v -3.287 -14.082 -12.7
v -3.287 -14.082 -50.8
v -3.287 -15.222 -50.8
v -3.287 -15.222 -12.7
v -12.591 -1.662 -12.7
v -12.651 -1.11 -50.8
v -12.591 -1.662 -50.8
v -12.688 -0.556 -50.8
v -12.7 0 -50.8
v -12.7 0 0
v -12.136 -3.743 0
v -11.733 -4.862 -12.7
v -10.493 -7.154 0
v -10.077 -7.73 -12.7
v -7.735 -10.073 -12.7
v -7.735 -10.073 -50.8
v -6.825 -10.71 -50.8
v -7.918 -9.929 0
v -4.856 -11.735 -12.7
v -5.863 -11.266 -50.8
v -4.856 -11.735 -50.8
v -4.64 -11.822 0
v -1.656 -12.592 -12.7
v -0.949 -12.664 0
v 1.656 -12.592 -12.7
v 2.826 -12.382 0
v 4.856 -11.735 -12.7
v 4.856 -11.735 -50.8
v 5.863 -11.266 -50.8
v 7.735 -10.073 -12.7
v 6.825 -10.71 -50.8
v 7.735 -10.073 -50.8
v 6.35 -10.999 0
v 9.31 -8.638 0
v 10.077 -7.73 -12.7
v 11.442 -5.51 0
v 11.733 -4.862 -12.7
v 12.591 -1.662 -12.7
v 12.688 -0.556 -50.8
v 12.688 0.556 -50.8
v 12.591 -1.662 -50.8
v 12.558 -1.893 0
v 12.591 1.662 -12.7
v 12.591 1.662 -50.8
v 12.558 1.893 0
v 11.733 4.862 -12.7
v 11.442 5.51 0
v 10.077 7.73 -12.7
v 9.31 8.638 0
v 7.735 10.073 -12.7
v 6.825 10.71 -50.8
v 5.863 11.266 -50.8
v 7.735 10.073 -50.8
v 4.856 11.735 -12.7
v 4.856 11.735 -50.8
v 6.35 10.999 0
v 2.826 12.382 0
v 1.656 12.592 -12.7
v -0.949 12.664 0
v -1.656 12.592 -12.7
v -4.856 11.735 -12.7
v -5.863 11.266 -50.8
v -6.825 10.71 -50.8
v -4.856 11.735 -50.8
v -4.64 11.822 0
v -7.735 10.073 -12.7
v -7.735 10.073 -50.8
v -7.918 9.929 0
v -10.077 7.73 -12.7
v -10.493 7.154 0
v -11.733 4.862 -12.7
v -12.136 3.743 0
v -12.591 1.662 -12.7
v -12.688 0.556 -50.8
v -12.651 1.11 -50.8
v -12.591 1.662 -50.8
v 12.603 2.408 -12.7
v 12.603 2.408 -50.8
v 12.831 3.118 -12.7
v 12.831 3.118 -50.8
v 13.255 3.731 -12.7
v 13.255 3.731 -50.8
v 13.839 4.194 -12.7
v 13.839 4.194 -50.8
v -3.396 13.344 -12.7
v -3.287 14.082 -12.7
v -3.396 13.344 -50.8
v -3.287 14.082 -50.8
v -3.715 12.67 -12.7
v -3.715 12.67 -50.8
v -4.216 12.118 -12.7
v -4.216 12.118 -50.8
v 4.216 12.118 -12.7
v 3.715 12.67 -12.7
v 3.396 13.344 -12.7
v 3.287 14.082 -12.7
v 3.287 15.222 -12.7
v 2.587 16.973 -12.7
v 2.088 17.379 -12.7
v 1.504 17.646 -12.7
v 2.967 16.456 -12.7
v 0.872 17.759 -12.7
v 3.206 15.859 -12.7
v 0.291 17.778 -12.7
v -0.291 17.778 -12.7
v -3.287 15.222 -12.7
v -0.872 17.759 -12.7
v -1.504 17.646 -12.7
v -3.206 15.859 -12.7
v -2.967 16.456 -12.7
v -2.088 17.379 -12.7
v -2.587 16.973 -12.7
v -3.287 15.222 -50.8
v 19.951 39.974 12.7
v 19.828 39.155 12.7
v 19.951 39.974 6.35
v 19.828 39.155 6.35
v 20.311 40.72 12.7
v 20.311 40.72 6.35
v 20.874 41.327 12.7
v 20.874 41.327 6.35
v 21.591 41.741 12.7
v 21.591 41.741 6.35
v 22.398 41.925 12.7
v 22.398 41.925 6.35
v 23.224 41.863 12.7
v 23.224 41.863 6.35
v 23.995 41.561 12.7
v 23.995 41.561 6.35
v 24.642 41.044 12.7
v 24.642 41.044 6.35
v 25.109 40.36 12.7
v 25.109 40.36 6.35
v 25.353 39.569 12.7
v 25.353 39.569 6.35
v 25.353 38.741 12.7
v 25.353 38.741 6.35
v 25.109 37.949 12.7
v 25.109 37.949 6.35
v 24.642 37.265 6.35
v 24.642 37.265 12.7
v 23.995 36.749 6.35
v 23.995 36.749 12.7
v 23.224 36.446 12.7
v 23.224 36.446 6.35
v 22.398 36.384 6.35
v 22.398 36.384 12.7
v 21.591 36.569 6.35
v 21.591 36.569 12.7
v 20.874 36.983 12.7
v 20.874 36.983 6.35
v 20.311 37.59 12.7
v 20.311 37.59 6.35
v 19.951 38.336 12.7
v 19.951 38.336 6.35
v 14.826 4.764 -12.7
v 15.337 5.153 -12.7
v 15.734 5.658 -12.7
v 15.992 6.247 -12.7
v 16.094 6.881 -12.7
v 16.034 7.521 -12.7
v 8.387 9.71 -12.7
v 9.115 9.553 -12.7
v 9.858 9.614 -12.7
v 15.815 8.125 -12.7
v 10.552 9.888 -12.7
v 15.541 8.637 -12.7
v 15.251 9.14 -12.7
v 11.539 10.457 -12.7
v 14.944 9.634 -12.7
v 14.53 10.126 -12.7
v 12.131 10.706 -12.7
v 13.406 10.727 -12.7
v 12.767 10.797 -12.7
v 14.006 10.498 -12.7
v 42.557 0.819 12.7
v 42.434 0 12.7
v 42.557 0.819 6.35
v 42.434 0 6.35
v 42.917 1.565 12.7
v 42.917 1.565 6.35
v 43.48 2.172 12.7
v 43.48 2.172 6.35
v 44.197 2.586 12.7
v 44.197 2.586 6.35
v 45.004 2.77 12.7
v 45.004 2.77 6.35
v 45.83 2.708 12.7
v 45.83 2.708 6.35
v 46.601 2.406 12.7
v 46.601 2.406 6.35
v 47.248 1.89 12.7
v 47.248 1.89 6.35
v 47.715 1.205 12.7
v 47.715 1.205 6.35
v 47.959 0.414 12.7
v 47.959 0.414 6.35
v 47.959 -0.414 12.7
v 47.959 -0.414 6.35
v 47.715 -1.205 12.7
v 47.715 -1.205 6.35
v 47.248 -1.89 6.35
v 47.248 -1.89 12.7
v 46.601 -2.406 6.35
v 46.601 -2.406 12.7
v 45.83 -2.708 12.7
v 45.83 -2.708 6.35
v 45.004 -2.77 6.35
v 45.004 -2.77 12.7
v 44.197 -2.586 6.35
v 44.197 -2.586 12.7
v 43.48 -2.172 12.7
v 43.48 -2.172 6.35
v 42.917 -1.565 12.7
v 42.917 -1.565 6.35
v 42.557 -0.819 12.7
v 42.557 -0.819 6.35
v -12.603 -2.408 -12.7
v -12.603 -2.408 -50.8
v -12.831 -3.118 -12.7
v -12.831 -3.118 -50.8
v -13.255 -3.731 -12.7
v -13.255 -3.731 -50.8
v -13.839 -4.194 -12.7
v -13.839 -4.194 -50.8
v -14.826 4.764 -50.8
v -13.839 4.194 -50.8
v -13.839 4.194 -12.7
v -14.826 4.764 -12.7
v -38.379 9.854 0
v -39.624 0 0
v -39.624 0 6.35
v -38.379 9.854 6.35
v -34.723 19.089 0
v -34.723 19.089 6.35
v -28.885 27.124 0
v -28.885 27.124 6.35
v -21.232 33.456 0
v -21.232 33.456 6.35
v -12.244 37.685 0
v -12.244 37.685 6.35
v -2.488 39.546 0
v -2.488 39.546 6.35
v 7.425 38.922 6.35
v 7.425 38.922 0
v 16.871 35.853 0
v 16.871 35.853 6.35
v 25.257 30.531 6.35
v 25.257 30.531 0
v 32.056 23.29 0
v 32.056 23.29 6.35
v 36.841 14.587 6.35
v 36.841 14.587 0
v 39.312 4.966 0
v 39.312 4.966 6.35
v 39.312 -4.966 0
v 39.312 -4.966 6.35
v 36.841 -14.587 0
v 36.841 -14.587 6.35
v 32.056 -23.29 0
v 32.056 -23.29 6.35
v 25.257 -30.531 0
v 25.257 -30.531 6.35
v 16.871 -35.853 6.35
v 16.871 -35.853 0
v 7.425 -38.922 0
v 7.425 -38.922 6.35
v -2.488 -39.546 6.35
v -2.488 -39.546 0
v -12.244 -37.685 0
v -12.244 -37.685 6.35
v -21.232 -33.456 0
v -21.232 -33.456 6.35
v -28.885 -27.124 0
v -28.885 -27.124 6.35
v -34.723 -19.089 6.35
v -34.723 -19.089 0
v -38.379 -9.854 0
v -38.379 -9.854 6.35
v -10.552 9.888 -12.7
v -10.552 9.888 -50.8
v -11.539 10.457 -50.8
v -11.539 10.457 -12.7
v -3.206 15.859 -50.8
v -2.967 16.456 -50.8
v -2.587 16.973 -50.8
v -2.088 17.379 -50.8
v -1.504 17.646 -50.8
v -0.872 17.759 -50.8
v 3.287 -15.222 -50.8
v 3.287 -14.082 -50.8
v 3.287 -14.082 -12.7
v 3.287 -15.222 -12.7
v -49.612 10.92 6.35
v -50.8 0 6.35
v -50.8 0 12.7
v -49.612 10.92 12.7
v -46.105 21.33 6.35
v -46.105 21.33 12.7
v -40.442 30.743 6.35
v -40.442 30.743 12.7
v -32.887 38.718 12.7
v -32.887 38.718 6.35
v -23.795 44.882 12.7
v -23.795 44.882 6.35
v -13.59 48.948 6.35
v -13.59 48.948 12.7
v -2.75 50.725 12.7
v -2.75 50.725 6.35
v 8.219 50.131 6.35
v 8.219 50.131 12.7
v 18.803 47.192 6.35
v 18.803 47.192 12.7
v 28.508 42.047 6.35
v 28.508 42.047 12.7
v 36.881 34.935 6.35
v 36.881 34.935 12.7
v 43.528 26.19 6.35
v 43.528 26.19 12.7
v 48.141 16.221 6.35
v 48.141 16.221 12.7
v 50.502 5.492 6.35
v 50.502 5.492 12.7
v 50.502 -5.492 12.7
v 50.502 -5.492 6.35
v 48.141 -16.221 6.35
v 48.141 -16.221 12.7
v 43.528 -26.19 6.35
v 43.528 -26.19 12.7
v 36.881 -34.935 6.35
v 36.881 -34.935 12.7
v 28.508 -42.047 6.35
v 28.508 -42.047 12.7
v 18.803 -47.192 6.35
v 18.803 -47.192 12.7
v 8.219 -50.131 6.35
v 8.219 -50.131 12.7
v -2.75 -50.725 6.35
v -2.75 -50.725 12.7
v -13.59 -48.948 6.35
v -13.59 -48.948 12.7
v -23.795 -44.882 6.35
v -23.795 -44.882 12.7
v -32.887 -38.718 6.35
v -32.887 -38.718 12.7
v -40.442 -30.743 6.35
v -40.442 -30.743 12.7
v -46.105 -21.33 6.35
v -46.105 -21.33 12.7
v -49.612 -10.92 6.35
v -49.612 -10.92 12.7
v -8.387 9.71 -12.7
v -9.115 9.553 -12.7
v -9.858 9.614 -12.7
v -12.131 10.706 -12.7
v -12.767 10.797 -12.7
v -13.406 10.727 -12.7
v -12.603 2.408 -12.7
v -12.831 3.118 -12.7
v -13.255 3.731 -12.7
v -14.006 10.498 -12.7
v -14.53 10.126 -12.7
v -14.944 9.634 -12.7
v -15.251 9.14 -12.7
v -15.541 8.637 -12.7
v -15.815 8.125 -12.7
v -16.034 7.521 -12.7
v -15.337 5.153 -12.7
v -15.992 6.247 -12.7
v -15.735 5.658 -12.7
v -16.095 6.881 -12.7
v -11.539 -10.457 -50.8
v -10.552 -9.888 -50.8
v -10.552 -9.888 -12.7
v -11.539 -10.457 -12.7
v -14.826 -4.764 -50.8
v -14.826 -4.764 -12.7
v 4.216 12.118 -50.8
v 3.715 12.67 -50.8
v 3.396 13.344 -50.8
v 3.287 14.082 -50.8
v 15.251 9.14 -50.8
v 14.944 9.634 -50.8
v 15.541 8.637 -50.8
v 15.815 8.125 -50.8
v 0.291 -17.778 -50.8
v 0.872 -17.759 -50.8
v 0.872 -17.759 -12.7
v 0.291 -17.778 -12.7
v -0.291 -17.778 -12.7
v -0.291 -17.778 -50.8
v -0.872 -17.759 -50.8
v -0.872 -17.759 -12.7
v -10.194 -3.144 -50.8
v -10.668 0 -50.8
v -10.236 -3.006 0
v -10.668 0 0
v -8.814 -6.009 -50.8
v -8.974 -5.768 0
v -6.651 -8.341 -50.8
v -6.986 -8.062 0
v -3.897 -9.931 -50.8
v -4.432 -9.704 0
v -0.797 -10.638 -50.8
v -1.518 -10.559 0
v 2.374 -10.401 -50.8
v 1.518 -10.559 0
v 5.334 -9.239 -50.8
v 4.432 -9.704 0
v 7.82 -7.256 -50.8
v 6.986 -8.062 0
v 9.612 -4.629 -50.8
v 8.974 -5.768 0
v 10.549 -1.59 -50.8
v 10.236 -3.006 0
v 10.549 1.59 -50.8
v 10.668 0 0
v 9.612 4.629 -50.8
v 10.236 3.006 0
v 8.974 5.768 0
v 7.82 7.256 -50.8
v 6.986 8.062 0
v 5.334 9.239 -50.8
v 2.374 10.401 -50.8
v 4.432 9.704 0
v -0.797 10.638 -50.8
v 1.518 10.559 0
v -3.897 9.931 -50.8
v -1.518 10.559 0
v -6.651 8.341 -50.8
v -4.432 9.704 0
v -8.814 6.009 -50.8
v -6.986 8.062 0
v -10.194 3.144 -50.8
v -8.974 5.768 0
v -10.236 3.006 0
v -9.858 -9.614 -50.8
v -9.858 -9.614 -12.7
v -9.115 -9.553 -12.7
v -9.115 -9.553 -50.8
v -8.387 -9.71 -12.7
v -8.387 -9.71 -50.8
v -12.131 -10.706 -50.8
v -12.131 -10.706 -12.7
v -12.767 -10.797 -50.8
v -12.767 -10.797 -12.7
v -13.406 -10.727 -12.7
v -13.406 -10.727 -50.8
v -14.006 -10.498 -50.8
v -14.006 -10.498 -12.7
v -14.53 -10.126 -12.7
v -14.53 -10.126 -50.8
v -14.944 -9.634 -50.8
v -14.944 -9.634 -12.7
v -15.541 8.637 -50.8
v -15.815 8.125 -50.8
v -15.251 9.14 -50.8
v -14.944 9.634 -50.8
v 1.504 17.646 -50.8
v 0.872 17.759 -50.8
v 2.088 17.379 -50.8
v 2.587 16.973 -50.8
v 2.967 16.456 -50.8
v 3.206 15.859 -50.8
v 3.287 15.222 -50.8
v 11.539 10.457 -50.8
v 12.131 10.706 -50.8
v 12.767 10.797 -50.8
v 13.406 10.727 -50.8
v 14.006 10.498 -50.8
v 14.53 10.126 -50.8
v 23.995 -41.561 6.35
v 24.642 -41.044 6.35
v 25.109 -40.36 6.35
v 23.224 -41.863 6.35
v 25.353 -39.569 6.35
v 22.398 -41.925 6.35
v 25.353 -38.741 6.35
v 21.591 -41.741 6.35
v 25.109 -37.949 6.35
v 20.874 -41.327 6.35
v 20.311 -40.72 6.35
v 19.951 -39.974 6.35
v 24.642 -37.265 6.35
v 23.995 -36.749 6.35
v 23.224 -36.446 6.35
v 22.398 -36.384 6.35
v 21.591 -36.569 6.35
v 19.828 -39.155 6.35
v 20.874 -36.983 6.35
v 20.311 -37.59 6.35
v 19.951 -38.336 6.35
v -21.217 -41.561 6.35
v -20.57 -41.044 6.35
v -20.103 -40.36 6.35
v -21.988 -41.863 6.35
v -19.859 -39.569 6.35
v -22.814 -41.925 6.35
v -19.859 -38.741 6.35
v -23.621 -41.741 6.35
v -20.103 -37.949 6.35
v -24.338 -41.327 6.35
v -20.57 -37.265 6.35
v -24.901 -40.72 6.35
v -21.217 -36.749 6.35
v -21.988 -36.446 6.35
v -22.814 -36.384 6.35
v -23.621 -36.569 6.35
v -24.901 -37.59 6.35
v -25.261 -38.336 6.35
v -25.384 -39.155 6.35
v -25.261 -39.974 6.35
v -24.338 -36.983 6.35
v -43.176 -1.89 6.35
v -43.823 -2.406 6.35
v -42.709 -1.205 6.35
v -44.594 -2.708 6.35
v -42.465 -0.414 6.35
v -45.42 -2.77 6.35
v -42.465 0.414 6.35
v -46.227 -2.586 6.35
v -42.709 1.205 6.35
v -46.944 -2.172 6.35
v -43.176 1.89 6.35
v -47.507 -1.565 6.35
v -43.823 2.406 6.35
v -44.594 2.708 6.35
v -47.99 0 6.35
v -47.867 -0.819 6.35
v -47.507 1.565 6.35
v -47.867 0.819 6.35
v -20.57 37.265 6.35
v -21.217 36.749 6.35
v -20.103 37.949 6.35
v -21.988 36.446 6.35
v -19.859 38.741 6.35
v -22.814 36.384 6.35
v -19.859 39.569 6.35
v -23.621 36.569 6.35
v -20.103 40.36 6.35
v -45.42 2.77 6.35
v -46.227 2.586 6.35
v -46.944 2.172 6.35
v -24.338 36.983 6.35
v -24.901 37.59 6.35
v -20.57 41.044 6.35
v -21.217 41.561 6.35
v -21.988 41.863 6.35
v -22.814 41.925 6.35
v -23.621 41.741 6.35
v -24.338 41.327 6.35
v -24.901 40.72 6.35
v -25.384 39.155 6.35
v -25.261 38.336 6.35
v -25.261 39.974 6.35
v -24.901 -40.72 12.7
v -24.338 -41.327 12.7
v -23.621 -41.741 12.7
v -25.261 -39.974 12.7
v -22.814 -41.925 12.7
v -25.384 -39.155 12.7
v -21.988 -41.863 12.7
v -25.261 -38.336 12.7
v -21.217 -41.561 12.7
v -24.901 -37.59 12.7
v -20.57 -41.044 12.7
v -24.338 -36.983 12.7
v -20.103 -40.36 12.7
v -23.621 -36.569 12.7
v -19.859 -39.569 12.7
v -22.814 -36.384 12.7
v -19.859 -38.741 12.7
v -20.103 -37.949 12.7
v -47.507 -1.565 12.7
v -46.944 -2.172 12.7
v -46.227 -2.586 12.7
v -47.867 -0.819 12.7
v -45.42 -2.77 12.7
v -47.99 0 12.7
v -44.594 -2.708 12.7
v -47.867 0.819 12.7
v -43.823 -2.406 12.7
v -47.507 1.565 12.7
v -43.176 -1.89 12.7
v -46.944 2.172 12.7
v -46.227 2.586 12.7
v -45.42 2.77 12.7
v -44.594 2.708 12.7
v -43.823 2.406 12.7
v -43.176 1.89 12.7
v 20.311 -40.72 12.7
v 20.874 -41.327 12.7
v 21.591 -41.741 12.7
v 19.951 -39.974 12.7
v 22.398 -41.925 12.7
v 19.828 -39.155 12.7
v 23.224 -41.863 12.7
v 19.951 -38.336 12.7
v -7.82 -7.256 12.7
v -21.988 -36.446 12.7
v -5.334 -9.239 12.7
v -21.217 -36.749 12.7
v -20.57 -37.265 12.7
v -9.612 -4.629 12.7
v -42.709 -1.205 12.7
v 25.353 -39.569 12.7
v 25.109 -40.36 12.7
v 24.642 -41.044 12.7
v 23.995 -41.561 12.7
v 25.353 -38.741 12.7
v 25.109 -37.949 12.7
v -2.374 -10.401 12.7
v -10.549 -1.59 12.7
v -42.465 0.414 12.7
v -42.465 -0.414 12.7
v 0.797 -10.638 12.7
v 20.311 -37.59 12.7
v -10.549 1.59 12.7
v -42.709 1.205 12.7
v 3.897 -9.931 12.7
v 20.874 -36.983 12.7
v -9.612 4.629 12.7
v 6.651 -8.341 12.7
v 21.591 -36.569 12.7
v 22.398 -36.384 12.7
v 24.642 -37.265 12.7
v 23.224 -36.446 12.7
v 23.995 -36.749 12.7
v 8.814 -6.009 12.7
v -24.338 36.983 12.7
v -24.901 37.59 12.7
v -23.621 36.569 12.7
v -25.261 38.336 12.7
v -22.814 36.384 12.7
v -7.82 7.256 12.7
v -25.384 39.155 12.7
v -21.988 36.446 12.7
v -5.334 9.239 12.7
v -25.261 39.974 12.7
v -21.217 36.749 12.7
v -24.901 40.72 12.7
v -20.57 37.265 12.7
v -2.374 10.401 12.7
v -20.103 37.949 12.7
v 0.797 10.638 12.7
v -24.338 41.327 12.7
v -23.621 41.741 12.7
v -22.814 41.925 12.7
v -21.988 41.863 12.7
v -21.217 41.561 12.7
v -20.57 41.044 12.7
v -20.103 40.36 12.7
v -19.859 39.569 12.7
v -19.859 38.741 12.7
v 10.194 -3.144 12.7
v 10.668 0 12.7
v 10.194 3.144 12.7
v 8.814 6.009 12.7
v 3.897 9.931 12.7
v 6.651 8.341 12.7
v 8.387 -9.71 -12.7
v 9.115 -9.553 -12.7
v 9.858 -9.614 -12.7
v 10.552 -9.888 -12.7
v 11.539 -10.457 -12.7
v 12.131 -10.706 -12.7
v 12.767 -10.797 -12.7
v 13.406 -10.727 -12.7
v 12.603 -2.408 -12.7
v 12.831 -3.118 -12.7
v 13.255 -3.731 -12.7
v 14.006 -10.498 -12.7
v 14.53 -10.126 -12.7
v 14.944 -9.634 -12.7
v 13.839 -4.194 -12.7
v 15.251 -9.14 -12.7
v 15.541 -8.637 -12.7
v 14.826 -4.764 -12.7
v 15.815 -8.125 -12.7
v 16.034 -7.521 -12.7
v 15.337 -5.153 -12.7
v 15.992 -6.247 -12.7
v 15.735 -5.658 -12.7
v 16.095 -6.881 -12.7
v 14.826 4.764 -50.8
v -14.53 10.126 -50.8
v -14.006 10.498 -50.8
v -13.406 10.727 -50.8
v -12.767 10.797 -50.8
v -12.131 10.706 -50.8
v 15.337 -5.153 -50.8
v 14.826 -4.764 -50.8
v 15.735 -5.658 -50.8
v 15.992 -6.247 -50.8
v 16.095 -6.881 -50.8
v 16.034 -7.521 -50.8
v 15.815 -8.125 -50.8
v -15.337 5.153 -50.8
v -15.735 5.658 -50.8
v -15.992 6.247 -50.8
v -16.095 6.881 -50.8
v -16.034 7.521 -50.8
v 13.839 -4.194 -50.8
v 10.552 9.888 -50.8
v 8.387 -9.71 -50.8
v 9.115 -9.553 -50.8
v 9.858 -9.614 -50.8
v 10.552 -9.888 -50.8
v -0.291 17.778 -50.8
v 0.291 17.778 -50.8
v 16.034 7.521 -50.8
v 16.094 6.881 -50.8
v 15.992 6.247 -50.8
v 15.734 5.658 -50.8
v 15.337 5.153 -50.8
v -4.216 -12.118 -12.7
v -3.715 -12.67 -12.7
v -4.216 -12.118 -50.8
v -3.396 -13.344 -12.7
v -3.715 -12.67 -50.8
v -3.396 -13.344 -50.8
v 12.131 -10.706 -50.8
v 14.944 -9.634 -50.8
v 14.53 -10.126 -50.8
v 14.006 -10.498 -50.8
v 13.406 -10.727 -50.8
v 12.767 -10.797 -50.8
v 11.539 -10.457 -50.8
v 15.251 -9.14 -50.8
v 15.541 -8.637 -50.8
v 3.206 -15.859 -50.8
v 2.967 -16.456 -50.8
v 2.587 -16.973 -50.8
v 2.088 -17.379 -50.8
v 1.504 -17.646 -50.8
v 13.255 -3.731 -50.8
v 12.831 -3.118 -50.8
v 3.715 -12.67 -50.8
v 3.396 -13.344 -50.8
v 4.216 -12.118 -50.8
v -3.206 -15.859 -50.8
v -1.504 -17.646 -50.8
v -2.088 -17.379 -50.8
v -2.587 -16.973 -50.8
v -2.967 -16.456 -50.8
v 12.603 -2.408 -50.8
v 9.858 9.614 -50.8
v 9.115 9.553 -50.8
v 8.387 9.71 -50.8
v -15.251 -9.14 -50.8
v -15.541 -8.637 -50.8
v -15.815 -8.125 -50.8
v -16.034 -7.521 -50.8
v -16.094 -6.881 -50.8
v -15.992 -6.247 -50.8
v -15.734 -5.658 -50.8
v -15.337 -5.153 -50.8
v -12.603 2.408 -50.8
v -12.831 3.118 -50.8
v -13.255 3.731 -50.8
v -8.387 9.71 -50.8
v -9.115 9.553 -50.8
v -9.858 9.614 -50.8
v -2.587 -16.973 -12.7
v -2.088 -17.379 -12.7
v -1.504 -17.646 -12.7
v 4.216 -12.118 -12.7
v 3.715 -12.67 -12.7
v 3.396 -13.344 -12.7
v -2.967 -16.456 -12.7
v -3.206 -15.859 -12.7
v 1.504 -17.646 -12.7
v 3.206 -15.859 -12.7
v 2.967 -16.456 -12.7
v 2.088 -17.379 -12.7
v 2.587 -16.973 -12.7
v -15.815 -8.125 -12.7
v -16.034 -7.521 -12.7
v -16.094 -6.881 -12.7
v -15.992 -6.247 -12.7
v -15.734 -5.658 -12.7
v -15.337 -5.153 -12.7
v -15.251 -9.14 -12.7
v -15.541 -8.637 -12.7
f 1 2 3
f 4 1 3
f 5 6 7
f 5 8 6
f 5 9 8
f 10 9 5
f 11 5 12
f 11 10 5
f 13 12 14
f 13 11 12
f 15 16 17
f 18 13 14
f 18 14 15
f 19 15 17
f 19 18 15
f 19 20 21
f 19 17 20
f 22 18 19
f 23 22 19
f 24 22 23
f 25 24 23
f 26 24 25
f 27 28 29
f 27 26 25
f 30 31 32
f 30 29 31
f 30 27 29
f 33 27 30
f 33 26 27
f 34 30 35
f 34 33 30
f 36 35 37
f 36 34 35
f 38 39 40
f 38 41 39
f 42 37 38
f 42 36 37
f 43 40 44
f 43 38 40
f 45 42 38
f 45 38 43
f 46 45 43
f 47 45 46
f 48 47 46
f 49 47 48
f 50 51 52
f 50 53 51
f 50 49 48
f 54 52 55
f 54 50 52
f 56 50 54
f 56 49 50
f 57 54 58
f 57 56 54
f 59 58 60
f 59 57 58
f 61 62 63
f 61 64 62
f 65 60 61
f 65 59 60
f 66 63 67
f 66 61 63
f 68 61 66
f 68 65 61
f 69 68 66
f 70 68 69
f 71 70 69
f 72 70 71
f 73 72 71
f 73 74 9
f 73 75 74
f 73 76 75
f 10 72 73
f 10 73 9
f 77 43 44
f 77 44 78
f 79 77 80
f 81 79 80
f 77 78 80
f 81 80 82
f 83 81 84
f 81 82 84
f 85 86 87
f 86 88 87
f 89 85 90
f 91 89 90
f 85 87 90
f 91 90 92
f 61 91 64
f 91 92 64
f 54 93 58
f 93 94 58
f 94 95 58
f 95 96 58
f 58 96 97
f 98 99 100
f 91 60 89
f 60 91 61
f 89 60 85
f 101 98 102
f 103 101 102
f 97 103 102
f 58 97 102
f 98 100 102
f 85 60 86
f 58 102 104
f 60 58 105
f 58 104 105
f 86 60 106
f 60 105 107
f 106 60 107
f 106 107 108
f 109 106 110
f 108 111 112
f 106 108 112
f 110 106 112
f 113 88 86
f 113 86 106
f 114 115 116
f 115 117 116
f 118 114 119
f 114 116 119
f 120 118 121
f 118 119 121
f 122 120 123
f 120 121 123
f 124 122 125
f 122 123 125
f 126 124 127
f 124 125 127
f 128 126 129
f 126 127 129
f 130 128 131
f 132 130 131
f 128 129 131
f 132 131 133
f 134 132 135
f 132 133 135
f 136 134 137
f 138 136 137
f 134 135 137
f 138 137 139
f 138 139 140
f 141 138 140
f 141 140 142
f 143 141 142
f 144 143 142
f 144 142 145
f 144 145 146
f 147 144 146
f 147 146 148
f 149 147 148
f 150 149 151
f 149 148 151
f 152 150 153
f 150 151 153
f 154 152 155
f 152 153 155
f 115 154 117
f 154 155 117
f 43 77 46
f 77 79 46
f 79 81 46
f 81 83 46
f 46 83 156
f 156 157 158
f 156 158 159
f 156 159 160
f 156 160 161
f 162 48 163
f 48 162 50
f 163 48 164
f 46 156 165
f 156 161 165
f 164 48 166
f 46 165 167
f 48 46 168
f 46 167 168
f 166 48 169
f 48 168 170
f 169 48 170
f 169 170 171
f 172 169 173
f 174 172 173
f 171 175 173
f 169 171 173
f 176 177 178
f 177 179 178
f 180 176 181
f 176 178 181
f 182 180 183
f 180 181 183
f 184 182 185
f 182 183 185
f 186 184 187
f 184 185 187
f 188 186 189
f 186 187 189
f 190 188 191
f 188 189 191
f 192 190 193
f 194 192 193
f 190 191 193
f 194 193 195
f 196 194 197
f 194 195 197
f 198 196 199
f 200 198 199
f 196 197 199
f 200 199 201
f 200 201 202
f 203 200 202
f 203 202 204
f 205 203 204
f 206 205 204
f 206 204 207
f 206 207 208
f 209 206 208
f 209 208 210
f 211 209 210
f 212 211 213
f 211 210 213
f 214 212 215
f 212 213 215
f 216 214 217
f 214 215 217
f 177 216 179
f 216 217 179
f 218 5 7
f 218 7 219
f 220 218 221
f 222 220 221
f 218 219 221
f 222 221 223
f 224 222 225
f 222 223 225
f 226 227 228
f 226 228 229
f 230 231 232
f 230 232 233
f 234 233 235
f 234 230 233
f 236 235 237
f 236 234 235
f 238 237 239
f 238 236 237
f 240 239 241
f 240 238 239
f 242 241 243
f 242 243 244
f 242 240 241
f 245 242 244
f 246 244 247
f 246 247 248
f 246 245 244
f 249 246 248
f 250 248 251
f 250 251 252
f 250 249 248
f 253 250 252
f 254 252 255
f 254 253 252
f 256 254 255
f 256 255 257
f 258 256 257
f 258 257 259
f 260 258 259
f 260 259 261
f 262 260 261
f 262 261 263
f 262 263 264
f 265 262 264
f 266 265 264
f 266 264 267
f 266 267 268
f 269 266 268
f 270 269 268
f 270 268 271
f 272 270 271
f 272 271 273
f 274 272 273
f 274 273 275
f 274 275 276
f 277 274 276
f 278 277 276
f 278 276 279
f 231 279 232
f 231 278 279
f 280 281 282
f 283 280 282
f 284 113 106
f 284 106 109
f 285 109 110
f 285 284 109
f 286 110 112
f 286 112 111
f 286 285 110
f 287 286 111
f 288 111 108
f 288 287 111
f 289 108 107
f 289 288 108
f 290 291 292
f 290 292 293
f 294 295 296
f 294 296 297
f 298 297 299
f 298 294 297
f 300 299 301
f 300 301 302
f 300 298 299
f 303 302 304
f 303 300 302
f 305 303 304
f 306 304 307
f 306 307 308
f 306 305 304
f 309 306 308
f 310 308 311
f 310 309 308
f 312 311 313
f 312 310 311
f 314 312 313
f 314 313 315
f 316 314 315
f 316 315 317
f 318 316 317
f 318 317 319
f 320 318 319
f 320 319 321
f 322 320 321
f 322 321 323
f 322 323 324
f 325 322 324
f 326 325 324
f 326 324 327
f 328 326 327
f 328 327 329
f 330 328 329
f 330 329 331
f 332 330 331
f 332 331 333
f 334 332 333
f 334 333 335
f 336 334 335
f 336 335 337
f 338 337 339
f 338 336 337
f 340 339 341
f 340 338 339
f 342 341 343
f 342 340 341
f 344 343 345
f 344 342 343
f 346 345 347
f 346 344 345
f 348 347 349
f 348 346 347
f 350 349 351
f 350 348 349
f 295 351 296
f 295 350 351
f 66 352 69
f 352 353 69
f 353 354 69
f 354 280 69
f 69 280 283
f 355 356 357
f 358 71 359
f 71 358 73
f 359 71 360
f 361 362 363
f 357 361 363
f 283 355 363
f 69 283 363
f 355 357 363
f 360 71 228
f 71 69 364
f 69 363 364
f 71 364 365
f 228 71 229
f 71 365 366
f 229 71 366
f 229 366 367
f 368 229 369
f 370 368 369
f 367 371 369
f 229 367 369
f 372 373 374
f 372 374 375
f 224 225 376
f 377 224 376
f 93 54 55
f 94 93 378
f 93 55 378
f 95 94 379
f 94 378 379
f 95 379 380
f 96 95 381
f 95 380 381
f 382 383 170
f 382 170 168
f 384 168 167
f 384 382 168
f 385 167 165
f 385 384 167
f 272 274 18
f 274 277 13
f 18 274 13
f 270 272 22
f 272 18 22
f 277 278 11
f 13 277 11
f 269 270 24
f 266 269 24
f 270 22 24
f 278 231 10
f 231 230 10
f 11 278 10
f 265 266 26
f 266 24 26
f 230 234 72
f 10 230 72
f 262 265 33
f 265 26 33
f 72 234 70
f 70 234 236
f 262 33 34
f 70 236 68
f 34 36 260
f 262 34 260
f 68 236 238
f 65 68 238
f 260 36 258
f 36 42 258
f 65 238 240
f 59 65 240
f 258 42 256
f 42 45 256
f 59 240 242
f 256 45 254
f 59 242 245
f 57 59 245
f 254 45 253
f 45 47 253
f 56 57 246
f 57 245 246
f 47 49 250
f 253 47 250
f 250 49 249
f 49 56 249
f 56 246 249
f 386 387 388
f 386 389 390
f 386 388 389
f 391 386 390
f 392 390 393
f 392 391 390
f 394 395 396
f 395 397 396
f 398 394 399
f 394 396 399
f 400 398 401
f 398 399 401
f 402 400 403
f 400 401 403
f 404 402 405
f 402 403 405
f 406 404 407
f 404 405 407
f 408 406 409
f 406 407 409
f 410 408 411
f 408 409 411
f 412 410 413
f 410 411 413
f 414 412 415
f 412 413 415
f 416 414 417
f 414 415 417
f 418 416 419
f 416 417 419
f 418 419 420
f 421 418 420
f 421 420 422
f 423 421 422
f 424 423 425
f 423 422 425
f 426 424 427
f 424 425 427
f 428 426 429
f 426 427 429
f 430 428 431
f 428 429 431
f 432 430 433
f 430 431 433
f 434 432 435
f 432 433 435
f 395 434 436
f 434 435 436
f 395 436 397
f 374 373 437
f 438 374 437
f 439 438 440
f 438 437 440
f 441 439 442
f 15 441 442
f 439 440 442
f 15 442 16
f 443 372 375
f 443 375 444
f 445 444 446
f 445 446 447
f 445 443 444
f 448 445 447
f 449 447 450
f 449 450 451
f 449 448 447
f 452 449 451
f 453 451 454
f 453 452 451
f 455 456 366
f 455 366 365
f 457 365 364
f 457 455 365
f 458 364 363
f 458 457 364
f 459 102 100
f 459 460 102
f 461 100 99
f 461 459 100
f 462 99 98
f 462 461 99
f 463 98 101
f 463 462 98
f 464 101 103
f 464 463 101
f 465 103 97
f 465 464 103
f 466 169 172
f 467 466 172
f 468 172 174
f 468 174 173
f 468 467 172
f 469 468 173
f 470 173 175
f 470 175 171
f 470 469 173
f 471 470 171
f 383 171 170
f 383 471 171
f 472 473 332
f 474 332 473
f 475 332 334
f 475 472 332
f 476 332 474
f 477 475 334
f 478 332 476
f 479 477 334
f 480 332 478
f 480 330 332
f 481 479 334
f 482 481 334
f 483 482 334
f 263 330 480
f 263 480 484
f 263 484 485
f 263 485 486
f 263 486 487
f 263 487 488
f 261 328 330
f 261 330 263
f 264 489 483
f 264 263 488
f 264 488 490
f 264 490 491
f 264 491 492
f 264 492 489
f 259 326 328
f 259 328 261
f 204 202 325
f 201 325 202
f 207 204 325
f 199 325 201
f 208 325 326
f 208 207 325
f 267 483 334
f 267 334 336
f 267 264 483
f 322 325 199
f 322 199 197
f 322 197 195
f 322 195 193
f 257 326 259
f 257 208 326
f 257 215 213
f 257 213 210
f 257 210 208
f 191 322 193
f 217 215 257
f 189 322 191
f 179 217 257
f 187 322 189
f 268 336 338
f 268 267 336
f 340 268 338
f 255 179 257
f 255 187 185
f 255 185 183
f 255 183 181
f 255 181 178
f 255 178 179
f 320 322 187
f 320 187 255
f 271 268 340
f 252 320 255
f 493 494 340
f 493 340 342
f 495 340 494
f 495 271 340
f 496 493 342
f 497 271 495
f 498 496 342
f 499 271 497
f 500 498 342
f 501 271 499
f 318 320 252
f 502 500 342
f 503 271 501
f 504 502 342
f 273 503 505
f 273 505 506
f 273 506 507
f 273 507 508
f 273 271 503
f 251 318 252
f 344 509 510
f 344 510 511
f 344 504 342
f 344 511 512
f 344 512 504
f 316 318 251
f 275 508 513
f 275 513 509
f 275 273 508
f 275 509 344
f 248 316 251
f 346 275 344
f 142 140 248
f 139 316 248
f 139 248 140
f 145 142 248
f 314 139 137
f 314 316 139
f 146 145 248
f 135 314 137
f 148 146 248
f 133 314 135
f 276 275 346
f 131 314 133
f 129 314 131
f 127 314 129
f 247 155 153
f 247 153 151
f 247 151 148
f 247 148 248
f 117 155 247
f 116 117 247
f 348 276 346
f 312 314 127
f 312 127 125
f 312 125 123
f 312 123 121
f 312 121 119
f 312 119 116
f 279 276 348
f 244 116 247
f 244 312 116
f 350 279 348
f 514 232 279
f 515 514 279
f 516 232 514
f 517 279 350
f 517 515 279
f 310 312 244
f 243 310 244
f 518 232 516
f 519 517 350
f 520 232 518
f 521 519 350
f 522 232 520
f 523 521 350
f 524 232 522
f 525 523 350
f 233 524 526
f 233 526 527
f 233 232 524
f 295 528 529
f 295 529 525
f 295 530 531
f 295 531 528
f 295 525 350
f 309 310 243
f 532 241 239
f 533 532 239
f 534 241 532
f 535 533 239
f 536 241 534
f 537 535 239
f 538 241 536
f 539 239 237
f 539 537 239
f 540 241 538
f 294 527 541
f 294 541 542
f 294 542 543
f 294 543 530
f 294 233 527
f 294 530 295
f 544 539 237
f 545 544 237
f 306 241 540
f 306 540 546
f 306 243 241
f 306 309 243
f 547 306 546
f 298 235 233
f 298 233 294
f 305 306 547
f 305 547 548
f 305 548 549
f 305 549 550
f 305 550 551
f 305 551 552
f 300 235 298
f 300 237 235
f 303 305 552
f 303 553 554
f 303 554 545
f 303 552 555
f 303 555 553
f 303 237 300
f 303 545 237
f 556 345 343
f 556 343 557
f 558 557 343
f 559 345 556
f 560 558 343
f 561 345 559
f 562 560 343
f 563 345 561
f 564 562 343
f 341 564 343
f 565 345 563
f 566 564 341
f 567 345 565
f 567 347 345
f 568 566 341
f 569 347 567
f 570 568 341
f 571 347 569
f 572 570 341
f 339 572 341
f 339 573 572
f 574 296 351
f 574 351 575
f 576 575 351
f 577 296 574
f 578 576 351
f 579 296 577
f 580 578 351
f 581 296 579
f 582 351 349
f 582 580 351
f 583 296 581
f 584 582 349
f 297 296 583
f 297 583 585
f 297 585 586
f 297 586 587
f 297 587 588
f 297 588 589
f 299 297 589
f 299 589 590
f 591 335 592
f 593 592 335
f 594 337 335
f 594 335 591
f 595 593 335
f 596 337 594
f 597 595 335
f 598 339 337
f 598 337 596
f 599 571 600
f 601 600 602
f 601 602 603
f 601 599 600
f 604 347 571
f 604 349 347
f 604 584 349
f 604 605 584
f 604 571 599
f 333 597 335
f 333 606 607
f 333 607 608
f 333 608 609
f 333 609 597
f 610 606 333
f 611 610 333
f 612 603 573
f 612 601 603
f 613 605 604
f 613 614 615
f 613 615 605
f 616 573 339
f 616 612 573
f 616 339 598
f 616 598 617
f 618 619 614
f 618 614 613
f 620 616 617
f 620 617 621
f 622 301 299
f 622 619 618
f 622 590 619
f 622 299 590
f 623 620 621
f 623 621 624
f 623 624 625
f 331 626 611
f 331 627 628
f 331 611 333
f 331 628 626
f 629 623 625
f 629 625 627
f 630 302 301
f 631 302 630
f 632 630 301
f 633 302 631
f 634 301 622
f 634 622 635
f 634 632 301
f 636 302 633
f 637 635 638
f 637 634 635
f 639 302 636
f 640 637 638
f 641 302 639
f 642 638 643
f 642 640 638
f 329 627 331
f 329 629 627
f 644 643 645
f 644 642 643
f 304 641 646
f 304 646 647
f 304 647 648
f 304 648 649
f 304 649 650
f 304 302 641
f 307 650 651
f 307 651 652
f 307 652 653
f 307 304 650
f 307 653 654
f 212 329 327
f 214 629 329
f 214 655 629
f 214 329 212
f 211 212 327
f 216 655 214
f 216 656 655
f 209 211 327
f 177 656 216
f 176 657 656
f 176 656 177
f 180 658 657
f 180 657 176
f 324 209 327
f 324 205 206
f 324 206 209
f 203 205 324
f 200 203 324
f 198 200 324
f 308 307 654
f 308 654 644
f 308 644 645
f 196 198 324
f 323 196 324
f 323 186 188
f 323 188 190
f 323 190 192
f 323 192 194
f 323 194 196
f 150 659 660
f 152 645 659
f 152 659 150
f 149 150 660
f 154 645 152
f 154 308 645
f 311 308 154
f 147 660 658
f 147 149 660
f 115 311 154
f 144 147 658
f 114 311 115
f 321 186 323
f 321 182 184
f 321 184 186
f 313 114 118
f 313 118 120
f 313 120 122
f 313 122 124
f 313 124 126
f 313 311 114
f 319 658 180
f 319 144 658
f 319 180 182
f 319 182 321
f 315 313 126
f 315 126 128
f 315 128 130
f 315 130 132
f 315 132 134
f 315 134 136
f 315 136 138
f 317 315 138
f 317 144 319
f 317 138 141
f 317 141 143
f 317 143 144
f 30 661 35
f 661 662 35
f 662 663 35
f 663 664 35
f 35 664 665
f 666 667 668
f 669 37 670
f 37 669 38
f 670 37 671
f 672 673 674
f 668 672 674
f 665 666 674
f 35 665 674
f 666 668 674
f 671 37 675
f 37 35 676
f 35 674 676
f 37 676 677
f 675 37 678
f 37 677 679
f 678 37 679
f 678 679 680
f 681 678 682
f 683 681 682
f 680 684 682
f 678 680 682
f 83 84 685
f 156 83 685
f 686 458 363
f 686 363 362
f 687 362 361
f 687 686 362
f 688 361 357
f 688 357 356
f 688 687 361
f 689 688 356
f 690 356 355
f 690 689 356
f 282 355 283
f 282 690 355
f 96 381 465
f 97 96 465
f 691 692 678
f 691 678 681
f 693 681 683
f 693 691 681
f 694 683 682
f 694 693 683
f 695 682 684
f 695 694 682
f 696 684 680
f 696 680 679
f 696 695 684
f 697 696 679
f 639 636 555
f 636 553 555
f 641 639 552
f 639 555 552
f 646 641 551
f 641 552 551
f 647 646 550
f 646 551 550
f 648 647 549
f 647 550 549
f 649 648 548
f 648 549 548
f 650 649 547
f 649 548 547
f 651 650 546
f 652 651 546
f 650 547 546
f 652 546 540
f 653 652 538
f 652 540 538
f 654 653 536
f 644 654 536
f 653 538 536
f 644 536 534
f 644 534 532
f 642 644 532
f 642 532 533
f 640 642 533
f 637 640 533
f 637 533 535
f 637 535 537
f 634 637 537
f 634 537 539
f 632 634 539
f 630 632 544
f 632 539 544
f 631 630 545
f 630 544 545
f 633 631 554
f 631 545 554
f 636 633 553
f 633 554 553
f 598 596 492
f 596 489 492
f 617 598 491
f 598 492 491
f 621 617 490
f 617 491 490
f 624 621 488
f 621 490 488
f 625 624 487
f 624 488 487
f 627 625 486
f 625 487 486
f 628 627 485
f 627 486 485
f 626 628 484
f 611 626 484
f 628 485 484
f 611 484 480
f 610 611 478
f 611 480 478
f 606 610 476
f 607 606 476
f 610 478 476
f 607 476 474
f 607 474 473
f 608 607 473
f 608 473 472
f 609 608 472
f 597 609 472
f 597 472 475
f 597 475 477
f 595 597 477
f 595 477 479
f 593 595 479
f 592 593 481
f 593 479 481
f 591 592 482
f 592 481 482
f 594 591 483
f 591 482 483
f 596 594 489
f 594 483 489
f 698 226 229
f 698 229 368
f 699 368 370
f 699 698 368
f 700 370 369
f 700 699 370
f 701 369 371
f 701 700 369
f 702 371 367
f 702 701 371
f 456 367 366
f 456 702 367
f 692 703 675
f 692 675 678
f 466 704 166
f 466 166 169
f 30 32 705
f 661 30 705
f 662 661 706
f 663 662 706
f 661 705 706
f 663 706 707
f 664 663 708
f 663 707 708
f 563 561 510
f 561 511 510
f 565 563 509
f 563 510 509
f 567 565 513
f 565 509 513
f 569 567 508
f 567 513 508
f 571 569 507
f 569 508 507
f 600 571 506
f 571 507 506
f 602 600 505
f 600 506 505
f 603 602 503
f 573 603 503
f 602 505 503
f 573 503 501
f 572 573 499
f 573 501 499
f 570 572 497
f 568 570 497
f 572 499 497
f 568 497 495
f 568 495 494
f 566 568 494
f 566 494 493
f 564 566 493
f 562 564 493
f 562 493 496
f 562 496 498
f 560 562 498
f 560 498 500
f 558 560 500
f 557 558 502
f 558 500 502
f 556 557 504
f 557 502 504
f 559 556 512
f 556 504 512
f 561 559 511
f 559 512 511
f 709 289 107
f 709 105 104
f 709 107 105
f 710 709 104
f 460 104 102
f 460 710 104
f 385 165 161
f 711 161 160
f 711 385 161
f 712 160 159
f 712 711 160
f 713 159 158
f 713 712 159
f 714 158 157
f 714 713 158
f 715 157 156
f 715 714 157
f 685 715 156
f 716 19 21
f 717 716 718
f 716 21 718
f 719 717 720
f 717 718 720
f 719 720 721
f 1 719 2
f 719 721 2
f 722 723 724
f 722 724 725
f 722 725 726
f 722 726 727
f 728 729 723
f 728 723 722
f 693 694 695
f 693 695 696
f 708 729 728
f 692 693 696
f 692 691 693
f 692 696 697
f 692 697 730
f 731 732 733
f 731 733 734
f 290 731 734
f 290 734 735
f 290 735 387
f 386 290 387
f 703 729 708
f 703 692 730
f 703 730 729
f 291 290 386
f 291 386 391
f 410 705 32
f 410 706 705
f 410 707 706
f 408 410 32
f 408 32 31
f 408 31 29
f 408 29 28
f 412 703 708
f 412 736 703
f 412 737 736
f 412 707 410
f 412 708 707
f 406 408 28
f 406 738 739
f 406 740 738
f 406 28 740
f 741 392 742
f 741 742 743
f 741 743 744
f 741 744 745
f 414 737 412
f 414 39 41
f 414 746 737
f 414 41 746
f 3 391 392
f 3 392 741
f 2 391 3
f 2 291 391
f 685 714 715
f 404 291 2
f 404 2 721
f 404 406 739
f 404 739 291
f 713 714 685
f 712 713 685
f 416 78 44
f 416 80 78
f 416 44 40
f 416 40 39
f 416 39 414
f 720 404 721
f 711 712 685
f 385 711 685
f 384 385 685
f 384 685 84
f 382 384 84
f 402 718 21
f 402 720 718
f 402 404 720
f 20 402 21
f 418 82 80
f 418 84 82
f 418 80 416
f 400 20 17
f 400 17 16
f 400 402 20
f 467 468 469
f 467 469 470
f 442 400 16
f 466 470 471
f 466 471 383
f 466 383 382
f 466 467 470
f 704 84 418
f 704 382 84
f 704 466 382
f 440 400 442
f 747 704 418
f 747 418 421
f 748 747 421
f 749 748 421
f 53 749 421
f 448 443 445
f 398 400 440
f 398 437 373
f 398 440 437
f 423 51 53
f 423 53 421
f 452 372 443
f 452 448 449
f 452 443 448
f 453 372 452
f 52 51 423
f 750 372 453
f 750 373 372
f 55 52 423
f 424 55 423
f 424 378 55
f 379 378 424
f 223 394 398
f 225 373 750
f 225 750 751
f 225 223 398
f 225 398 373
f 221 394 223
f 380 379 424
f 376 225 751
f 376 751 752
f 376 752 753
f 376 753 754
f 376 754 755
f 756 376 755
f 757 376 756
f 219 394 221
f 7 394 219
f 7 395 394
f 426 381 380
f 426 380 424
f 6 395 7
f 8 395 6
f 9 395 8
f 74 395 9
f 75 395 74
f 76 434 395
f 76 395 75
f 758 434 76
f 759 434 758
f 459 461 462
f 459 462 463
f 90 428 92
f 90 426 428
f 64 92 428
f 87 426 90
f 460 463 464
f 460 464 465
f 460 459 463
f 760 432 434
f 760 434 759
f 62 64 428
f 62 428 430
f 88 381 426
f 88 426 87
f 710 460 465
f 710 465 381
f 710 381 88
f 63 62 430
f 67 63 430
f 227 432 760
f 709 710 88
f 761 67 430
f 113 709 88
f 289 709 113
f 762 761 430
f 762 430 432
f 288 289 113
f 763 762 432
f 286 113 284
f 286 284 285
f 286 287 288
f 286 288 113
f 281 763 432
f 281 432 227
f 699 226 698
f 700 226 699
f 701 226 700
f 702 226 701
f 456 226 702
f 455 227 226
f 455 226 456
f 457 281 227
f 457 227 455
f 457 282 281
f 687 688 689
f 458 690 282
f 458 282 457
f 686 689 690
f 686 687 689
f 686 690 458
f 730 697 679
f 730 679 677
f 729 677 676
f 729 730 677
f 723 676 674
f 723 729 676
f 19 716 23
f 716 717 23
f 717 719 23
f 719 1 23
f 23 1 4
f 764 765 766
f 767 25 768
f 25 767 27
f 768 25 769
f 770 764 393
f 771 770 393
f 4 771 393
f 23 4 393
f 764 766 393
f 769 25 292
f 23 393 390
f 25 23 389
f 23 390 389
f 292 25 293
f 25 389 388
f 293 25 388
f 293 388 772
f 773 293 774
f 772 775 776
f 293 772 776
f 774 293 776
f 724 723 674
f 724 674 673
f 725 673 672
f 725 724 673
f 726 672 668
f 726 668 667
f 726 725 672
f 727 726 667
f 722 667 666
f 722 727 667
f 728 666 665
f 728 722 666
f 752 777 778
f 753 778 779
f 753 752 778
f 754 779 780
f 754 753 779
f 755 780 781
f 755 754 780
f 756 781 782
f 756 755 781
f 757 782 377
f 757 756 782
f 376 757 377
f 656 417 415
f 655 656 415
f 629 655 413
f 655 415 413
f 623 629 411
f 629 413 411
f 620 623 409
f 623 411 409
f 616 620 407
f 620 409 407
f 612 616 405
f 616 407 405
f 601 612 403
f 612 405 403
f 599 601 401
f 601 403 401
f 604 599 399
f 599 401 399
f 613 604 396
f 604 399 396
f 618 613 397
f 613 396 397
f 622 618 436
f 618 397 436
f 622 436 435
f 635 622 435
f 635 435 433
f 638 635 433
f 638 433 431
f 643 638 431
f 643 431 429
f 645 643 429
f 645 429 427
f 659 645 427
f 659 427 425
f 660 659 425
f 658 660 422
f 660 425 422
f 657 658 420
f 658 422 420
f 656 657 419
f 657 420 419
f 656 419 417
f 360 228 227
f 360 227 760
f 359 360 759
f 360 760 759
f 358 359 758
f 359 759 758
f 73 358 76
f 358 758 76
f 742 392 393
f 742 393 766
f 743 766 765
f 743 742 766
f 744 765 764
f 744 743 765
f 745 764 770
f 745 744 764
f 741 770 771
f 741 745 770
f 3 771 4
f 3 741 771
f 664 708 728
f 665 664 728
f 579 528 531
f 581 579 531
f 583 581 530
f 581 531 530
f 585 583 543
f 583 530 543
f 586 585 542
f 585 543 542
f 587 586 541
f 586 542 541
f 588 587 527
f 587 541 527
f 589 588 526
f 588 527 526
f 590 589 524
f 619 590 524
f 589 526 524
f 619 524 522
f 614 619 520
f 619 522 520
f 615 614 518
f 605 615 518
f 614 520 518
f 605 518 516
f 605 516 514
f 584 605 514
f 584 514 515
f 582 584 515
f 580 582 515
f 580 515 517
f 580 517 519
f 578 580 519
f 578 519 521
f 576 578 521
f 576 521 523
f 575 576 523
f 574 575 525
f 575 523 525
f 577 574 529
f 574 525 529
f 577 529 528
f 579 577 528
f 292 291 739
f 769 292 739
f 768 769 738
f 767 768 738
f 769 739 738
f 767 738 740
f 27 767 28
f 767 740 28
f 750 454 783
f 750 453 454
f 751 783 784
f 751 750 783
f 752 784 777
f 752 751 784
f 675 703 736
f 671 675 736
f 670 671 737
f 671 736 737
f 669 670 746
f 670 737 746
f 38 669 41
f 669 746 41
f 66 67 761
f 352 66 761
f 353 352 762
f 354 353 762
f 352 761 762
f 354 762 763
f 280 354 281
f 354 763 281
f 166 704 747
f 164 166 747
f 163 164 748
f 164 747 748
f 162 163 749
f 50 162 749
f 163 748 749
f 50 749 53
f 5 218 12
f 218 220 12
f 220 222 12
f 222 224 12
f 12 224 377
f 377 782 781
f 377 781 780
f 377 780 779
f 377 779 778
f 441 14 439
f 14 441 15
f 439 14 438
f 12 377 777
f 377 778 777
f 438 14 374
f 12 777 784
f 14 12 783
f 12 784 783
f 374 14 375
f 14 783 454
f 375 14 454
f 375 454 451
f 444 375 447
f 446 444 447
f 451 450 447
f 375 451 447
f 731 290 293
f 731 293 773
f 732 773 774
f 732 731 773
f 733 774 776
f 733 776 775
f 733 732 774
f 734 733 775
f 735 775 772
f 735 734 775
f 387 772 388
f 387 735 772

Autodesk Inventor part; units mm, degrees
ref_plane "YZ Plane" through (0, 0, 0) normal (1, 0, 0) x (0, 1, 0)
ref_plane "XZ Plane" through (0, 0, 0) normal (0, 1, 0) x (-1, 0, 0)
ref_plane "XY Plane" through (0, 0, 0) normal (0, 0, 1) x (1, 0, 0)
sketch "Sketch1" plane through (0, 0, 0) normal (0, 0, 1) x (1, 0, 0)
  circle A0 centre (0, 0) radius 39.624
  circle A1 centre (0, 0) radius 10.668
  dimension "d0" = 79.248
  dimension "d1" = 21.336
extrude "Extrusion1" add sketch "Sketch1" along normal blind 12.7
sketch "Sketch2" plane through (0, 0, 0) normal (0, 0, -1) x (-1, 0, 0)
  circle A0 centre (0, 0) radius 39.624
  circle A1 centre (0, 0) radius 50.8
  line L0 (0, 0) -> (0, 50.8)
  circle A2 centre (0, 0) radius 39.624 projected
  line L1 (0, 0) -> (25.4, 43.9941)
  line L2 (-50.8, 0) -> (50.8, 0)
  line L3 (0, 0) -> (-25.4, 43.9941)
  line L4 (0, 0) -> (25.4, -43.9941)
  line L5 (0, 0) -> (-25.4, -43.9941)
  circle A3 centre (22.606, 39.1547) radius 2.7781
  circle A4 centre (45.212, 0) radius 2.7781
  circle A5 centre (-22.606, 39.1547) radius 2.7781
  circle A6 centre (-45.212, 0) radius 2.7781
  circle A7 centre (22.606, -39.1547) radius 2.7781
  circle A8 centre (-22.606, -39.1547) radius 2.7781
  dimension "d4" = 79.248
  dimension "d5" = 101.6
  dimension "d38" = 30
  dimension "d39" = 45.212
  dimension "d40" = 45.212
  dimension "d41" = 5.5563
  dimension "d42" = 5.5563
extrude "Extrusion2" add sketch "Sketch2" against normal blind 12.7 contours L2 A4 A1 L4 A7 A0 | A0 L1 A3 A1 L2 A4 | A0 L0 A1 L1 A3 | L4 A7 A1 L5 A8 A0 | A4 L2 | L2 A4 | A0 L3 A5 A1 L0 | A3 L1 | L1 A3 | L5 A8 A1 L2 A6 A0 | A7 L4 | L4 A7 | L2 A6 A1 L3 A5 A0 | A8 L5 | L5 A8 | A6 L2 | L2 A6 | A5 L3 | L3 A5
sketch "Sketch3" plane through (0, 0, 0) normal (0, 0, -1) x (-1, 0, 0)
  circle A0 centre (0, 0) radius 10.668
  circle A1 centre (0, 0) radius 12.7
  dimension "d21" = 21.336
  dimension "d22" = 25.4
extrude "Extrusion3" add sketch "Sketch3" along normal blind 50.8
sketch "Sketch4" plane through (0, 0, -50.8) normal (0, 0, -1) x (-1, 0, 0)
  circle A0 centre (0, 0) radius 12.7
  circle A1 centre (0, 0) radius 17.78
  line L0 (0, 0) -> (0, 17.78)
  line L1 (0, 0) -> (3.287, 12.2673)
  circle A2 centre (0, 0) radius 12.7 projected
  line L2 (0, 0) -> (-3.287, 12.2673)
  line L3 (3.287, 12.2673) -> (3.287, 17.4735)
  line L4 (-3.287, 12.2673) -> (-3.287, 17.4735)
  arc A3 (3.287, 14.082) -> (4.8558, 11.735) centre (5.827, 14.082) ccw
  arc A4 (3.287, 15.2217) -> (0.8715, 17.7586) centre (0.747, 15.2217) ccw
  arc A5 (-0.8715, 17.7586) -> (-3.287, 15.2217) centre (-0.747, 15.2217) ccw
  arc A6 (-4.8558, 11.735) -> (-3.287, 14.082) centre (-5.827, 14.082) ccw
  point P0 (-4.8558, 11.735)
  point P1 (4.8558, 11.735)
  dimension "d25" = 25.4
  dimension "d26" = 35.56
  dimension "d27" = 15
  dimension "d28" = 15
  dimension "d29" = 2.54
  dimension "d30" = 2.54
  dimension "d31" = 2.54
  dimension "d32" = 2.54
extrude "Extrusion4" add sketch "Sketch4" against normal blind 38.1 contours A0 L3 A3 | A6 L4 A0 | A0 L0 A1 A4 L3 | L4 A5 A1 L0 A0
pattern_circular "Circular Pattern2" count 6 over 360 about axis through (0, 0, 0) along (0, 0, -1) of "Extrusion4"
sketch "Sketch5" plane through (0, 0, 0) normal (0, 0, -1) x (-1, 0, 0)
  circle A0 centre (0, 0) radius 39.624
  circle A1 centre (0, 0) radius 50.8
  line L0 (0, 0) -> (0, 50.8)
  circle A2 centre (0, 0) radius 39.624
  line L1 (0, 0) -> (25.4, 43.9941)
  line L2 (-50.8, 0) -> (50.8, 0)
  line L3 (0, 0) -> (-25.4, 43.9941)
  line L4 (0, 0) -> (25.4, -43.9941)
  line L5 (0, 0) -> (-25.4, -43.9941)
  circle A3 centre (22.606, 39.1547) radius 2.7781
  circle A4 centre (45.212, 0) radius 2.7781
  circle A5 centre (-22.606, 39.1547) radius 2.7781
  circle A6 centre (-45.212, 0) radius 2.7781
  circle A7 centre (22.606, -39.1547) radius 2.7781
  circle A8 centre (-22.606, -39.1547) radius 2.7781
  dimension "d43" = 79.248
  dimension "d44" = 101.6
  dimension "d45" = 30
  dimension "d46" = 45.212
  dimension "d47" = 45.212
  dimension "d48" = 5.5563
  dimension "d49" = 5.5563
extrude "Extrusion5" cut sketch "Sketch5" against normal blind 6.35 contours L2 A4 A1 L4 A7 A0 | A0 L1 A3 A1 L2 A4 | A0 L0 A1 L1 A3 | L4 A7 A1 L5 A8 A0 | A4 L2 | L2 A4 | A0 L3 A5 A1 L0 | A3 L1 | L1 A3 | L5 A8 A1 L2 A6 A0 | A7 L4 | L4 A7 | L2 A6 A1 L3 A5 A0 | A8 L5 | L5 A8 | A6 L2 | L2 A6 | A5 L3 | L3 A5
sketch "Sketch6" plane through (0, 0, 6.35) normal (0, 0, -1) x (-1, 0, 0)
  circle A0 centre (0, 0) radius 39.624
  circle A1 centre (0, 0) radius 50.8
  line L0 (0, 0) -> (0, 50.8)
  circle A2 centre (0, 0) radius 39.624
  line L1 (0, 0) -> (25.4, 43.9941)
  line L2 (-50.8, 0) -> (50.8, 0)
  line L3 (0, 0) -> (-25.4, 43.9941)
  line L4 (0, 0) -> (25.4, -43.9941)
  line L5 (0, 0) -> (-25.4, -43.9941)
  circle A3 centre (22.606, 39.1547) radius 2.7781
  circle A4 centre (45.212, 0) radius 2.7781
  circle A5 centre (-22.606, 39.1547) radius 2.7781
  circle A6 centre (-45.212, 0) radius 2.7781
  circle A7 centre (22.606, -39.1547) radius 2.7781
  circle A8 centre (-22.606, -39.1547) radius 2.7781
  dimension "d53" = 79.248
  dimension "d54" = 101.6
  dimension "d55" = 30
  dimension "d56" = 45.212
  dimension "d57" = 45.212
  dimension "d58" = 5.5563
  dimension "d59" = 5.5563
extrude "Extrusion6" cut sketch "Sketch6" against normal blind 6.35 contours A4 L2 | L2 A4 | A3 L1 | L1 A3 | A7 L4 | L4 A7 | A8 L5 | L5 A8 | A6 L2 | L2 A6 | A5 L3 | L3 A5
equation "\"d0\" = 19.812 * scale"
equation "\"d2\" = 3.175 * scale"
equation "\"d4\" = 19.812 * scale"
equation "\"d5\" = 25.4 * scale"
equation "\"d39\" = 11.303 * scale"
equation "\"d40\" = 11.303 * scale"
equation "\"d16\" = 3.175 * scale"
equation "\"d23\" = 12.7 * scale"
equation "\"d29\" = 0.635 * scale"
equation "\"d30\" = 0.635 * scale"
equation "\"d31\" = 0.635 * scale"
equation "\"d32\" = 0.635 * scale"
equation "\"d33\" = 9.525 * scale"
equation "\"d43\" = 19.812 * d50"
equation "\"d44\" = 25.4 * d50"
equation "\"d46\" = 11.303 * d50"
equation "\"d47\" = 11.303 * d50"
equation "\"d51\" = 1.5875 * scale"
equation "\"d53\" = 19.812 * d60"
equation "\"d54\" = 25.4 * d60"
equation "\"d56\" = 11.303 * d60"
equation "\"d57\" = 11.303 * d60"
equation "\"d61\" = 1.5875 * scale"
equation "\"radius\" = 3.175"
equation "\"scale\" = 4"
equation "\"d50\" = 4"
equation "\"d60\" = 4"
properties part number "Rotor_Mount" material "Stainless Steel"
